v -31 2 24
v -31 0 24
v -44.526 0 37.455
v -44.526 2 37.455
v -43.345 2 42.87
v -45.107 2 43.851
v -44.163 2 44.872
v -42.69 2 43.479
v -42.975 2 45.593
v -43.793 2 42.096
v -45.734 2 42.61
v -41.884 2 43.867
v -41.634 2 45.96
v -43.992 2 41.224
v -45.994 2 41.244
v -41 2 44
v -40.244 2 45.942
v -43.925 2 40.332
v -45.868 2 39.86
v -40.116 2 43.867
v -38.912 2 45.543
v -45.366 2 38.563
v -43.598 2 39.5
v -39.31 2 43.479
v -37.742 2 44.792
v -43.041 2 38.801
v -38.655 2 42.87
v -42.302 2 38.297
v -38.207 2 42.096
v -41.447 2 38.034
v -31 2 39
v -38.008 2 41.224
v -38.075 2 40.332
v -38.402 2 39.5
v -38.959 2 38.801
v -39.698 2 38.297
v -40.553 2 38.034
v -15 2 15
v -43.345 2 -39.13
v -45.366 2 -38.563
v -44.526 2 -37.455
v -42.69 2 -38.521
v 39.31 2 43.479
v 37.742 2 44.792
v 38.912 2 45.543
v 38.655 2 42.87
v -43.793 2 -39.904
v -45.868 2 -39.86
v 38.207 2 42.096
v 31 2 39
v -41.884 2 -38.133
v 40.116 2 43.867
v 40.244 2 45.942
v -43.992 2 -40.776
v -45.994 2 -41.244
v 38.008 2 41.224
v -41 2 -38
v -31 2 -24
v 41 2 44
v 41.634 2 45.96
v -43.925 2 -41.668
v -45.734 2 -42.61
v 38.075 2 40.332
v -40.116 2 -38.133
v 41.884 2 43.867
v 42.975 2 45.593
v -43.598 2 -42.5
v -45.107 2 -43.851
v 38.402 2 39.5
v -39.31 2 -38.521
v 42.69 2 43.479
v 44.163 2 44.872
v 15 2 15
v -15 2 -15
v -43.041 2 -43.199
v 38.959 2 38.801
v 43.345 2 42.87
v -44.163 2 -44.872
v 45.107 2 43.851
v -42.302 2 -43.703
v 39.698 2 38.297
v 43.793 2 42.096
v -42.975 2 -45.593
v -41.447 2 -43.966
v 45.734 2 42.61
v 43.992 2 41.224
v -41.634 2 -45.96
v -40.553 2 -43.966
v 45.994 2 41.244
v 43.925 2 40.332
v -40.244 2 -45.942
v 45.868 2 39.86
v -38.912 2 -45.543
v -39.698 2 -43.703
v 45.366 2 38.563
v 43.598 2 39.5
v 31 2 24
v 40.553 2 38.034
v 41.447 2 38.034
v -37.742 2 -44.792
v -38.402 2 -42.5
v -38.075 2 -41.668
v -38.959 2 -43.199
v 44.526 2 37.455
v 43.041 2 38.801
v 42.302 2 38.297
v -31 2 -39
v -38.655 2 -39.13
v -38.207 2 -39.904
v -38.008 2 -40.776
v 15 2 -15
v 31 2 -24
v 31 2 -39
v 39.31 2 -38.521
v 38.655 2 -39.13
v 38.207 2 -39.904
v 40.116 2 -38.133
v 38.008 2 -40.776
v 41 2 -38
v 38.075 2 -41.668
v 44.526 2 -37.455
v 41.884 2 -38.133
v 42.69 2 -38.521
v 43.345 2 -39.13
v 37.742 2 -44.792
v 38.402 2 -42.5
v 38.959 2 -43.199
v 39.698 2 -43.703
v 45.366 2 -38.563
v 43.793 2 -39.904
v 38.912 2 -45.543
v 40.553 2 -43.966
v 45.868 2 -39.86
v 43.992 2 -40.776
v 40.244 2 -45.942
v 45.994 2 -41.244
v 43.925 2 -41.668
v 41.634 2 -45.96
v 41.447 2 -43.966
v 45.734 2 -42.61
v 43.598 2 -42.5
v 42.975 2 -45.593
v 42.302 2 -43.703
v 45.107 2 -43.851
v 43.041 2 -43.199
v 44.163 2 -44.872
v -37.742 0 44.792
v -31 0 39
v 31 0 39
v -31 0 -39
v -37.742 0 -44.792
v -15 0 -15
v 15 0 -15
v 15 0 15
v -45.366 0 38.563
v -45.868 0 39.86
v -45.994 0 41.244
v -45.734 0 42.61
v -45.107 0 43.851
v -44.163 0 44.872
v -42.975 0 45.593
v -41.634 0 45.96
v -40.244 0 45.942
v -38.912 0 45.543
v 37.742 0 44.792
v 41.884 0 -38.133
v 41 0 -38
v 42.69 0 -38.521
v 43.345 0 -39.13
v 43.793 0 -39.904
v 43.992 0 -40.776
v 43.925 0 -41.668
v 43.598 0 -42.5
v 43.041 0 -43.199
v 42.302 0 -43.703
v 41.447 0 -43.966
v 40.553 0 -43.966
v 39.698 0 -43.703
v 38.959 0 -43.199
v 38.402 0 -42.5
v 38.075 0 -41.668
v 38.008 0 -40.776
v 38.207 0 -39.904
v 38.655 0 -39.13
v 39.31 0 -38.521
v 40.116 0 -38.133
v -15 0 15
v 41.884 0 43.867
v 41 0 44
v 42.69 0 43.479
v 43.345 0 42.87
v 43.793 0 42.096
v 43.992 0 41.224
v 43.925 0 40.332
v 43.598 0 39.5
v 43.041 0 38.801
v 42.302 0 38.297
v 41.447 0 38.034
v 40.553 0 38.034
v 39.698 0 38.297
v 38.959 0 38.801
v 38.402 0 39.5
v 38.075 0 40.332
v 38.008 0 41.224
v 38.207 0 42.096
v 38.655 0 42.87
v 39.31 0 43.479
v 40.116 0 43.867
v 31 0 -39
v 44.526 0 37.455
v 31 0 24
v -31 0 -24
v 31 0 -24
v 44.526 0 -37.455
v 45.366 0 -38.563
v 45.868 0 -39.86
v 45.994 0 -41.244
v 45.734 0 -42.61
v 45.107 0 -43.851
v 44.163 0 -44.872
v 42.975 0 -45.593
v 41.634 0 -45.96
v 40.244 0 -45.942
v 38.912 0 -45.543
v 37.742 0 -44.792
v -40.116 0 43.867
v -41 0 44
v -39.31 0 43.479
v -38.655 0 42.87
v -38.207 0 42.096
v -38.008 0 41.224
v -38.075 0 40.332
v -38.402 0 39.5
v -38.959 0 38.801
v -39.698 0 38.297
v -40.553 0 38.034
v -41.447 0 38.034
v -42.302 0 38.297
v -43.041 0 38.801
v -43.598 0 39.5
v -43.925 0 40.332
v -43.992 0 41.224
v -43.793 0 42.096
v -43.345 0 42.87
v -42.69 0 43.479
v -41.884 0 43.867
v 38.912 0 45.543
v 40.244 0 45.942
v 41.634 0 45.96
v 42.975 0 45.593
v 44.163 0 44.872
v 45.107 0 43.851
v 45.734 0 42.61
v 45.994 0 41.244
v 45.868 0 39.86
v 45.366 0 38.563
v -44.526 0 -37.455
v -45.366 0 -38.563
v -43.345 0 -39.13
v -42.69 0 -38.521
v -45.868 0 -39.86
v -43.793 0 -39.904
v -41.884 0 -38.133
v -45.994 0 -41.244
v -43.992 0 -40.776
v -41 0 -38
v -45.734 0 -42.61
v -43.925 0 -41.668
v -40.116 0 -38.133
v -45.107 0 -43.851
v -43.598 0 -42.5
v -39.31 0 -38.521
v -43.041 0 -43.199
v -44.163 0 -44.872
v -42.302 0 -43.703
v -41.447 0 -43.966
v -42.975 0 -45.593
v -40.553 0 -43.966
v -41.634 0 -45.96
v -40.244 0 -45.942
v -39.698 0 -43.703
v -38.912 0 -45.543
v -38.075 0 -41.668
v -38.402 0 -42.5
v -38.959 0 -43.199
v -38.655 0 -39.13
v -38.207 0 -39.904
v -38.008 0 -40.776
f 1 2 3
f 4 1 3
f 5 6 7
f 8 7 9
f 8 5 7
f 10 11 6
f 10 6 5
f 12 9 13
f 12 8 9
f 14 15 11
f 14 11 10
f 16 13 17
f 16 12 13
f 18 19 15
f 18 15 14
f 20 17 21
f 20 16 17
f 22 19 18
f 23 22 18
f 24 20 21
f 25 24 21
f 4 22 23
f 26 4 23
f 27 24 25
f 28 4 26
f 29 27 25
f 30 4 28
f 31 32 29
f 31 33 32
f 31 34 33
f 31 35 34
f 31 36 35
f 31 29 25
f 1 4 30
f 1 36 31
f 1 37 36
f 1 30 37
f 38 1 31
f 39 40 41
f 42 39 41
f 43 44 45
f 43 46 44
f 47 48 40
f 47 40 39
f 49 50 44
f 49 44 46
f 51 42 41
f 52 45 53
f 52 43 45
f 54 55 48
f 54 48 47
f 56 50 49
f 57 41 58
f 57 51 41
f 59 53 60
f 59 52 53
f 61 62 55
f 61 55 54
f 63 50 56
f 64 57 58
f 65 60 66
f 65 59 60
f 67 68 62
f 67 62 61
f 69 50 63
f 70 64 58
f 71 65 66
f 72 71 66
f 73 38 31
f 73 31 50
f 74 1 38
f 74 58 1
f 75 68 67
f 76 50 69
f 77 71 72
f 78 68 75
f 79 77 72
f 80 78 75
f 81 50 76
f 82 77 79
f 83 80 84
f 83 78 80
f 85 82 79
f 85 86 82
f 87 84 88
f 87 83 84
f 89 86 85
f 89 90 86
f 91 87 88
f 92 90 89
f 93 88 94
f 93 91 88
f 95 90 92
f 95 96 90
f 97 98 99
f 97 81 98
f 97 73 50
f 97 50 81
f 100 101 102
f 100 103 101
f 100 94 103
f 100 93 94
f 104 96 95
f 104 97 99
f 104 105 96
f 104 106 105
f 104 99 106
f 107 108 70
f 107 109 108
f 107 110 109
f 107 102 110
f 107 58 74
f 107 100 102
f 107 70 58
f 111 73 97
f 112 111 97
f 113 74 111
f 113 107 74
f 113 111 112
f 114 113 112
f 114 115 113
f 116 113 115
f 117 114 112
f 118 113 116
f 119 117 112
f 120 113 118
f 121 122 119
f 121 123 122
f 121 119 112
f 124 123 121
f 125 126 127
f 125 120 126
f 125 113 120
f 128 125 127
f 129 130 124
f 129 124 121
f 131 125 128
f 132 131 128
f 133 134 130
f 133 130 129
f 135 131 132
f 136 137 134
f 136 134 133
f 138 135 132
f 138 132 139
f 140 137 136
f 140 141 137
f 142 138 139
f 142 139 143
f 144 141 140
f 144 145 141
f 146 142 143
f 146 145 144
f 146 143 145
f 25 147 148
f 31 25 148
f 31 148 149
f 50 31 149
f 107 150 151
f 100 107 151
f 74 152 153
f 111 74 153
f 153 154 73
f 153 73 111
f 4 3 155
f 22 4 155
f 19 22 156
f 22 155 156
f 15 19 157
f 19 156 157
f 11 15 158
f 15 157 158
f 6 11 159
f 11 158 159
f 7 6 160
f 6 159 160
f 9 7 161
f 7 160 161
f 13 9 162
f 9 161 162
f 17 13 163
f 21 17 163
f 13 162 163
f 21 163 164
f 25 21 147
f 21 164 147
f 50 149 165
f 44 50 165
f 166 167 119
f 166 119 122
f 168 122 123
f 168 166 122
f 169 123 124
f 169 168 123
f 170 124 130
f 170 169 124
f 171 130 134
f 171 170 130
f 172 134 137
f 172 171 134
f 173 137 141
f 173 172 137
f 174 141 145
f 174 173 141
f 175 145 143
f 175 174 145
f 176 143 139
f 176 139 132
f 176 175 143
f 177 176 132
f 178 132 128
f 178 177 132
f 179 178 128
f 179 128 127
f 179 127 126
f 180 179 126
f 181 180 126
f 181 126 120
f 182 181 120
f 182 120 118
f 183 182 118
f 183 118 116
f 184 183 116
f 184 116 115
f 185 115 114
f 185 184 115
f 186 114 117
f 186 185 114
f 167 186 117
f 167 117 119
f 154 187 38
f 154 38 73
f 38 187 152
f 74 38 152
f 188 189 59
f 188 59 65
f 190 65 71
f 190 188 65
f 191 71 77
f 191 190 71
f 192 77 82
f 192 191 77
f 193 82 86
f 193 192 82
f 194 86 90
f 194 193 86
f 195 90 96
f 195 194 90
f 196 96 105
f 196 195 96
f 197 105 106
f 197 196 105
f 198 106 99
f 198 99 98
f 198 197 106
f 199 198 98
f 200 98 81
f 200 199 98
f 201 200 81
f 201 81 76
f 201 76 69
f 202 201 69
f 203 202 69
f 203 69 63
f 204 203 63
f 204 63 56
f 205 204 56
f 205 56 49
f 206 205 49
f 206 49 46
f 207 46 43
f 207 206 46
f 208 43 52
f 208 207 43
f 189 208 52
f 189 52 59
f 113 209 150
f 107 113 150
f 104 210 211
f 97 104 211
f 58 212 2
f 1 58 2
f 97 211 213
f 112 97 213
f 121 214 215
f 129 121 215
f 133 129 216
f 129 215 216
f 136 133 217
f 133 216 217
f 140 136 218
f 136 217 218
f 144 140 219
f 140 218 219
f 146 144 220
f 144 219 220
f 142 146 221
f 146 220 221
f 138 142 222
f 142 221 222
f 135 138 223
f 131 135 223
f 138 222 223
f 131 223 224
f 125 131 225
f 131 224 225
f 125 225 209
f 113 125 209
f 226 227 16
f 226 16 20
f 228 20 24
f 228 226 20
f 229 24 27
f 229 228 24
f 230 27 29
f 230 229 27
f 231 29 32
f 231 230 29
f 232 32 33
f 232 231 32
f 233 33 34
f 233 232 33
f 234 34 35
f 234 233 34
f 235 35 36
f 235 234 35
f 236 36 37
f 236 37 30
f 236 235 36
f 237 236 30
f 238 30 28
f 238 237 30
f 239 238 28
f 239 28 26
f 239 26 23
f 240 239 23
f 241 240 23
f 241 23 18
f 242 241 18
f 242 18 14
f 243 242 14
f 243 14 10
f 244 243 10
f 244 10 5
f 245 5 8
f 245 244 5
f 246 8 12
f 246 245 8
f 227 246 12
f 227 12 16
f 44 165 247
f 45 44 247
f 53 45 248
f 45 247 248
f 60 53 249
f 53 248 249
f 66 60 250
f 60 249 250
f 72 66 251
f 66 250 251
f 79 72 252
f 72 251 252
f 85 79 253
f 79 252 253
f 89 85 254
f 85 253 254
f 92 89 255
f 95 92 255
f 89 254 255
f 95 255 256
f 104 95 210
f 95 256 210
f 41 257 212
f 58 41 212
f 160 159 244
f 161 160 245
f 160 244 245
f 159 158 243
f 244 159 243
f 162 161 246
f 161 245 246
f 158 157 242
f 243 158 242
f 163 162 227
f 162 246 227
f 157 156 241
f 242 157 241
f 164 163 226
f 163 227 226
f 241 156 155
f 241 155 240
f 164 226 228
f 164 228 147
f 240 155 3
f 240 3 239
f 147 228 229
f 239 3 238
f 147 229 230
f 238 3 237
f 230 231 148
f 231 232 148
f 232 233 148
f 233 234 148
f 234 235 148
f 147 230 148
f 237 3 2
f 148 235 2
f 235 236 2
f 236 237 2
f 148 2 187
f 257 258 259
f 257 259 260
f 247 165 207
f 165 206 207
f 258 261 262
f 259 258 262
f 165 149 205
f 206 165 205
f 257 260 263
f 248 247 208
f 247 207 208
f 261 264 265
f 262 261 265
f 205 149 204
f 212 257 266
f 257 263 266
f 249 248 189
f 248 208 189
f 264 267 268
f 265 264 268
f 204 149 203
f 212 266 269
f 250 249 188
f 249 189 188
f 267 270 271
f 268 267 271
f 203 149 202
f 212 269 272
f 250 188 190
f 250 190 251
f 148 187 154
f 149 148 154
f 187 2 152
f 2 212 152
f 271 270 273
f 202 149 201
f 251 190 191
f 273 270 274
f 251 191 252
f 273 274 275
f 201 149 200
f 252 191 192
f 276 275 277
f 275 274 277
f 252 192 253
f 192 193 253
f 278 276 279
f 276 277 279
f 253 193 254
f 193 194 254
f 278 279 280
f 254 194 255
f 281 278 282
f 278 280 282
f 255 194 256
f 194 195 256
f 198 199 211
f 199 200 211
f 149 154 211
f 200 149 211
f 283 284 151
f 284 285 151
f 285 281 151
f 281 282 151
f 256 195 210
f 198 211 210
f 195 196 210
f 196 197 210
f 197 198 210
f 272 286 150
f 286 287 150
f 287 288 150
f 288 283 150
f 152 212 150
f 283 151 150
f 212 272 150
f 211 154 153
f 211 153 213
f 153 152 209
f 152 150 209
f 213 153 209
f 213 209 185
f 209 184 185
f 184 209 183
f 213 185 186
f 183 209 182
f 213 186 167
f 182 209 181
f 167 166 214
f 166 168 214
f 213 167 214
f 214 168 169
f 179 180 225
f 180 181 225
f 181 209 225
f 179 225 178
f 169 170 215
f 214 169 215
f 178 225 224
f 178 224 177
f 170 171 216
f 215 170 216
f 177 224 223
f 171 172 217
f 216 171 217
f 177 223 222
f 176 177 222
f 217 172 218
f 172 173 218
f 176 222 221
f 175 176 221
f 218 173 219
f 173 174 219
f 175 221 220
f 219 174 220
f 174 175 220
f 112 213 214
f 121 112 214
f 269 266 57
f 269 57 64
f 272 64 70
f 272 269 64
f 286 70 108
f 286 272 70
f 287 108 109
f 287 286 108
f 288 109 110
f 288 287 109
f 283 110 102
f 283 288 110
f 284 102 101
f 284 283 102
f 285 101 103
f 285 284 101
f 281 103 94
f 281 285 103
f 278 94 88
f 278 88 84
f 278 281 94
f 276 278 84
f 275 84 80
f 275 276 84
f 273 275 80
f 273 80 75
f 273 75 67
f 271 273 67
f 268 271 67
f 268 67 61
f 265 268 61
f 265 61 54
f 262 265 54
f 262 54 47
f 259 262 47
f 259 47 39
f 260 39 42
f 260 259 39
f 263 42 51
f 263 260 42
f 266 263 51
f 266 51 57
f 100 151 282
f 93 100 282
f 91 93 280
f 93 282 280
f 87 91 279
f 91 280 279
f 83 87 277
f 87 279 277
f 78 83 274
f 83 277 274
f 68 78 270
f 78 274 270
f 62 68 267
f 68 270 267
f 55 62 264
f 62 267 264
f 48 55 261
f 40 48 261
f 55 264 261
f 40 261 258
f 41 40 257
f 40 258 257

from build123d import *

# Parameters (mm, degrees)
CROQUIS1_R              = 3
CROQUIS1_W              = 30
CROQUIS1_H              = 30
SALIENTE_EXTRUIR1_DEPTH = 2


with BuildPart() as part:
    # Croquis1 → Saliente-Extruir1 (new body)
    with BuildSketch(Plane(origin=(0, 0, 0), x_dir=(1, 0, 0), z_dir=(0, 1, 0))):
        with BuildLine():
            Line((-31, 39), (-37.741519768, 44.792401162))
            ThreePointArc((-37.741519768, 44.792401162), (-44.671057551, 44.394604021), (-44.526212448, 37.455169148))
            Line((-44.526212448, 37.455169148), (-31, 24))
            Line((-31, 24), (-31, -24))
            Line((-31, -24), (-44.526212448, -37.455169148))
            ThreePointArc((-44.526212448, -37.455169148), (-44.671057551, -44.394604021), (-37.741519768, -44.792401162))
            Line((-37.741519768, -44.792401162), (-31, -39))
            Line((-31, -39), (31, -39))
            Line((31, -39), (37.741519768, -44.792401162))
            ThreePointArc((37.741519768, -44.792401162), (44.671057551, -44.394604021), (44.526212448, -37.455169148))
            Line((44.526212448, -37.455169148), (31, -24))
            Line((31, -24), (31, 24))
            Line((31, 24), (44.526212448, 37.455169148))
            ThreePointArc((44.526212448, 37.455169148), (44.671057551, 44.394604021), (37.741519768, 44.792401162))
            Line((37.741519768, 44.792401162), (31, 39))
            Line((31, 39), (-31, 39))
        make_face()
        with Locations(Location((-41, 41, 0), (0, 0, 270))):
            Circle(CROQUIS1_R, mode=Mode.SUBTRACT)
        with Locations(Location((41, 41, 0), (0, 0, 270))):
            Circle(CROQUIS1_R, mode=Mode.SUBTRACT)
        with Locations(Location((41, -41, 0), (0, 0, 270))):
            Circle(CROQUIS1_R, mode=Mode.SUBTRACT)
        with Locations(Location((-41, -41, 0), (0, 0, 270))):
            Circle(CROQUIS1_R, mode=Mode.SUBTRACT)
        Rectangle(CROQUIS1_W, CROQUIS1_H, mode=Mode.SUBTRACT)
    extrude(amount=SALIENTE_EXTRUIR1_DEPTH)


solid = part.part
